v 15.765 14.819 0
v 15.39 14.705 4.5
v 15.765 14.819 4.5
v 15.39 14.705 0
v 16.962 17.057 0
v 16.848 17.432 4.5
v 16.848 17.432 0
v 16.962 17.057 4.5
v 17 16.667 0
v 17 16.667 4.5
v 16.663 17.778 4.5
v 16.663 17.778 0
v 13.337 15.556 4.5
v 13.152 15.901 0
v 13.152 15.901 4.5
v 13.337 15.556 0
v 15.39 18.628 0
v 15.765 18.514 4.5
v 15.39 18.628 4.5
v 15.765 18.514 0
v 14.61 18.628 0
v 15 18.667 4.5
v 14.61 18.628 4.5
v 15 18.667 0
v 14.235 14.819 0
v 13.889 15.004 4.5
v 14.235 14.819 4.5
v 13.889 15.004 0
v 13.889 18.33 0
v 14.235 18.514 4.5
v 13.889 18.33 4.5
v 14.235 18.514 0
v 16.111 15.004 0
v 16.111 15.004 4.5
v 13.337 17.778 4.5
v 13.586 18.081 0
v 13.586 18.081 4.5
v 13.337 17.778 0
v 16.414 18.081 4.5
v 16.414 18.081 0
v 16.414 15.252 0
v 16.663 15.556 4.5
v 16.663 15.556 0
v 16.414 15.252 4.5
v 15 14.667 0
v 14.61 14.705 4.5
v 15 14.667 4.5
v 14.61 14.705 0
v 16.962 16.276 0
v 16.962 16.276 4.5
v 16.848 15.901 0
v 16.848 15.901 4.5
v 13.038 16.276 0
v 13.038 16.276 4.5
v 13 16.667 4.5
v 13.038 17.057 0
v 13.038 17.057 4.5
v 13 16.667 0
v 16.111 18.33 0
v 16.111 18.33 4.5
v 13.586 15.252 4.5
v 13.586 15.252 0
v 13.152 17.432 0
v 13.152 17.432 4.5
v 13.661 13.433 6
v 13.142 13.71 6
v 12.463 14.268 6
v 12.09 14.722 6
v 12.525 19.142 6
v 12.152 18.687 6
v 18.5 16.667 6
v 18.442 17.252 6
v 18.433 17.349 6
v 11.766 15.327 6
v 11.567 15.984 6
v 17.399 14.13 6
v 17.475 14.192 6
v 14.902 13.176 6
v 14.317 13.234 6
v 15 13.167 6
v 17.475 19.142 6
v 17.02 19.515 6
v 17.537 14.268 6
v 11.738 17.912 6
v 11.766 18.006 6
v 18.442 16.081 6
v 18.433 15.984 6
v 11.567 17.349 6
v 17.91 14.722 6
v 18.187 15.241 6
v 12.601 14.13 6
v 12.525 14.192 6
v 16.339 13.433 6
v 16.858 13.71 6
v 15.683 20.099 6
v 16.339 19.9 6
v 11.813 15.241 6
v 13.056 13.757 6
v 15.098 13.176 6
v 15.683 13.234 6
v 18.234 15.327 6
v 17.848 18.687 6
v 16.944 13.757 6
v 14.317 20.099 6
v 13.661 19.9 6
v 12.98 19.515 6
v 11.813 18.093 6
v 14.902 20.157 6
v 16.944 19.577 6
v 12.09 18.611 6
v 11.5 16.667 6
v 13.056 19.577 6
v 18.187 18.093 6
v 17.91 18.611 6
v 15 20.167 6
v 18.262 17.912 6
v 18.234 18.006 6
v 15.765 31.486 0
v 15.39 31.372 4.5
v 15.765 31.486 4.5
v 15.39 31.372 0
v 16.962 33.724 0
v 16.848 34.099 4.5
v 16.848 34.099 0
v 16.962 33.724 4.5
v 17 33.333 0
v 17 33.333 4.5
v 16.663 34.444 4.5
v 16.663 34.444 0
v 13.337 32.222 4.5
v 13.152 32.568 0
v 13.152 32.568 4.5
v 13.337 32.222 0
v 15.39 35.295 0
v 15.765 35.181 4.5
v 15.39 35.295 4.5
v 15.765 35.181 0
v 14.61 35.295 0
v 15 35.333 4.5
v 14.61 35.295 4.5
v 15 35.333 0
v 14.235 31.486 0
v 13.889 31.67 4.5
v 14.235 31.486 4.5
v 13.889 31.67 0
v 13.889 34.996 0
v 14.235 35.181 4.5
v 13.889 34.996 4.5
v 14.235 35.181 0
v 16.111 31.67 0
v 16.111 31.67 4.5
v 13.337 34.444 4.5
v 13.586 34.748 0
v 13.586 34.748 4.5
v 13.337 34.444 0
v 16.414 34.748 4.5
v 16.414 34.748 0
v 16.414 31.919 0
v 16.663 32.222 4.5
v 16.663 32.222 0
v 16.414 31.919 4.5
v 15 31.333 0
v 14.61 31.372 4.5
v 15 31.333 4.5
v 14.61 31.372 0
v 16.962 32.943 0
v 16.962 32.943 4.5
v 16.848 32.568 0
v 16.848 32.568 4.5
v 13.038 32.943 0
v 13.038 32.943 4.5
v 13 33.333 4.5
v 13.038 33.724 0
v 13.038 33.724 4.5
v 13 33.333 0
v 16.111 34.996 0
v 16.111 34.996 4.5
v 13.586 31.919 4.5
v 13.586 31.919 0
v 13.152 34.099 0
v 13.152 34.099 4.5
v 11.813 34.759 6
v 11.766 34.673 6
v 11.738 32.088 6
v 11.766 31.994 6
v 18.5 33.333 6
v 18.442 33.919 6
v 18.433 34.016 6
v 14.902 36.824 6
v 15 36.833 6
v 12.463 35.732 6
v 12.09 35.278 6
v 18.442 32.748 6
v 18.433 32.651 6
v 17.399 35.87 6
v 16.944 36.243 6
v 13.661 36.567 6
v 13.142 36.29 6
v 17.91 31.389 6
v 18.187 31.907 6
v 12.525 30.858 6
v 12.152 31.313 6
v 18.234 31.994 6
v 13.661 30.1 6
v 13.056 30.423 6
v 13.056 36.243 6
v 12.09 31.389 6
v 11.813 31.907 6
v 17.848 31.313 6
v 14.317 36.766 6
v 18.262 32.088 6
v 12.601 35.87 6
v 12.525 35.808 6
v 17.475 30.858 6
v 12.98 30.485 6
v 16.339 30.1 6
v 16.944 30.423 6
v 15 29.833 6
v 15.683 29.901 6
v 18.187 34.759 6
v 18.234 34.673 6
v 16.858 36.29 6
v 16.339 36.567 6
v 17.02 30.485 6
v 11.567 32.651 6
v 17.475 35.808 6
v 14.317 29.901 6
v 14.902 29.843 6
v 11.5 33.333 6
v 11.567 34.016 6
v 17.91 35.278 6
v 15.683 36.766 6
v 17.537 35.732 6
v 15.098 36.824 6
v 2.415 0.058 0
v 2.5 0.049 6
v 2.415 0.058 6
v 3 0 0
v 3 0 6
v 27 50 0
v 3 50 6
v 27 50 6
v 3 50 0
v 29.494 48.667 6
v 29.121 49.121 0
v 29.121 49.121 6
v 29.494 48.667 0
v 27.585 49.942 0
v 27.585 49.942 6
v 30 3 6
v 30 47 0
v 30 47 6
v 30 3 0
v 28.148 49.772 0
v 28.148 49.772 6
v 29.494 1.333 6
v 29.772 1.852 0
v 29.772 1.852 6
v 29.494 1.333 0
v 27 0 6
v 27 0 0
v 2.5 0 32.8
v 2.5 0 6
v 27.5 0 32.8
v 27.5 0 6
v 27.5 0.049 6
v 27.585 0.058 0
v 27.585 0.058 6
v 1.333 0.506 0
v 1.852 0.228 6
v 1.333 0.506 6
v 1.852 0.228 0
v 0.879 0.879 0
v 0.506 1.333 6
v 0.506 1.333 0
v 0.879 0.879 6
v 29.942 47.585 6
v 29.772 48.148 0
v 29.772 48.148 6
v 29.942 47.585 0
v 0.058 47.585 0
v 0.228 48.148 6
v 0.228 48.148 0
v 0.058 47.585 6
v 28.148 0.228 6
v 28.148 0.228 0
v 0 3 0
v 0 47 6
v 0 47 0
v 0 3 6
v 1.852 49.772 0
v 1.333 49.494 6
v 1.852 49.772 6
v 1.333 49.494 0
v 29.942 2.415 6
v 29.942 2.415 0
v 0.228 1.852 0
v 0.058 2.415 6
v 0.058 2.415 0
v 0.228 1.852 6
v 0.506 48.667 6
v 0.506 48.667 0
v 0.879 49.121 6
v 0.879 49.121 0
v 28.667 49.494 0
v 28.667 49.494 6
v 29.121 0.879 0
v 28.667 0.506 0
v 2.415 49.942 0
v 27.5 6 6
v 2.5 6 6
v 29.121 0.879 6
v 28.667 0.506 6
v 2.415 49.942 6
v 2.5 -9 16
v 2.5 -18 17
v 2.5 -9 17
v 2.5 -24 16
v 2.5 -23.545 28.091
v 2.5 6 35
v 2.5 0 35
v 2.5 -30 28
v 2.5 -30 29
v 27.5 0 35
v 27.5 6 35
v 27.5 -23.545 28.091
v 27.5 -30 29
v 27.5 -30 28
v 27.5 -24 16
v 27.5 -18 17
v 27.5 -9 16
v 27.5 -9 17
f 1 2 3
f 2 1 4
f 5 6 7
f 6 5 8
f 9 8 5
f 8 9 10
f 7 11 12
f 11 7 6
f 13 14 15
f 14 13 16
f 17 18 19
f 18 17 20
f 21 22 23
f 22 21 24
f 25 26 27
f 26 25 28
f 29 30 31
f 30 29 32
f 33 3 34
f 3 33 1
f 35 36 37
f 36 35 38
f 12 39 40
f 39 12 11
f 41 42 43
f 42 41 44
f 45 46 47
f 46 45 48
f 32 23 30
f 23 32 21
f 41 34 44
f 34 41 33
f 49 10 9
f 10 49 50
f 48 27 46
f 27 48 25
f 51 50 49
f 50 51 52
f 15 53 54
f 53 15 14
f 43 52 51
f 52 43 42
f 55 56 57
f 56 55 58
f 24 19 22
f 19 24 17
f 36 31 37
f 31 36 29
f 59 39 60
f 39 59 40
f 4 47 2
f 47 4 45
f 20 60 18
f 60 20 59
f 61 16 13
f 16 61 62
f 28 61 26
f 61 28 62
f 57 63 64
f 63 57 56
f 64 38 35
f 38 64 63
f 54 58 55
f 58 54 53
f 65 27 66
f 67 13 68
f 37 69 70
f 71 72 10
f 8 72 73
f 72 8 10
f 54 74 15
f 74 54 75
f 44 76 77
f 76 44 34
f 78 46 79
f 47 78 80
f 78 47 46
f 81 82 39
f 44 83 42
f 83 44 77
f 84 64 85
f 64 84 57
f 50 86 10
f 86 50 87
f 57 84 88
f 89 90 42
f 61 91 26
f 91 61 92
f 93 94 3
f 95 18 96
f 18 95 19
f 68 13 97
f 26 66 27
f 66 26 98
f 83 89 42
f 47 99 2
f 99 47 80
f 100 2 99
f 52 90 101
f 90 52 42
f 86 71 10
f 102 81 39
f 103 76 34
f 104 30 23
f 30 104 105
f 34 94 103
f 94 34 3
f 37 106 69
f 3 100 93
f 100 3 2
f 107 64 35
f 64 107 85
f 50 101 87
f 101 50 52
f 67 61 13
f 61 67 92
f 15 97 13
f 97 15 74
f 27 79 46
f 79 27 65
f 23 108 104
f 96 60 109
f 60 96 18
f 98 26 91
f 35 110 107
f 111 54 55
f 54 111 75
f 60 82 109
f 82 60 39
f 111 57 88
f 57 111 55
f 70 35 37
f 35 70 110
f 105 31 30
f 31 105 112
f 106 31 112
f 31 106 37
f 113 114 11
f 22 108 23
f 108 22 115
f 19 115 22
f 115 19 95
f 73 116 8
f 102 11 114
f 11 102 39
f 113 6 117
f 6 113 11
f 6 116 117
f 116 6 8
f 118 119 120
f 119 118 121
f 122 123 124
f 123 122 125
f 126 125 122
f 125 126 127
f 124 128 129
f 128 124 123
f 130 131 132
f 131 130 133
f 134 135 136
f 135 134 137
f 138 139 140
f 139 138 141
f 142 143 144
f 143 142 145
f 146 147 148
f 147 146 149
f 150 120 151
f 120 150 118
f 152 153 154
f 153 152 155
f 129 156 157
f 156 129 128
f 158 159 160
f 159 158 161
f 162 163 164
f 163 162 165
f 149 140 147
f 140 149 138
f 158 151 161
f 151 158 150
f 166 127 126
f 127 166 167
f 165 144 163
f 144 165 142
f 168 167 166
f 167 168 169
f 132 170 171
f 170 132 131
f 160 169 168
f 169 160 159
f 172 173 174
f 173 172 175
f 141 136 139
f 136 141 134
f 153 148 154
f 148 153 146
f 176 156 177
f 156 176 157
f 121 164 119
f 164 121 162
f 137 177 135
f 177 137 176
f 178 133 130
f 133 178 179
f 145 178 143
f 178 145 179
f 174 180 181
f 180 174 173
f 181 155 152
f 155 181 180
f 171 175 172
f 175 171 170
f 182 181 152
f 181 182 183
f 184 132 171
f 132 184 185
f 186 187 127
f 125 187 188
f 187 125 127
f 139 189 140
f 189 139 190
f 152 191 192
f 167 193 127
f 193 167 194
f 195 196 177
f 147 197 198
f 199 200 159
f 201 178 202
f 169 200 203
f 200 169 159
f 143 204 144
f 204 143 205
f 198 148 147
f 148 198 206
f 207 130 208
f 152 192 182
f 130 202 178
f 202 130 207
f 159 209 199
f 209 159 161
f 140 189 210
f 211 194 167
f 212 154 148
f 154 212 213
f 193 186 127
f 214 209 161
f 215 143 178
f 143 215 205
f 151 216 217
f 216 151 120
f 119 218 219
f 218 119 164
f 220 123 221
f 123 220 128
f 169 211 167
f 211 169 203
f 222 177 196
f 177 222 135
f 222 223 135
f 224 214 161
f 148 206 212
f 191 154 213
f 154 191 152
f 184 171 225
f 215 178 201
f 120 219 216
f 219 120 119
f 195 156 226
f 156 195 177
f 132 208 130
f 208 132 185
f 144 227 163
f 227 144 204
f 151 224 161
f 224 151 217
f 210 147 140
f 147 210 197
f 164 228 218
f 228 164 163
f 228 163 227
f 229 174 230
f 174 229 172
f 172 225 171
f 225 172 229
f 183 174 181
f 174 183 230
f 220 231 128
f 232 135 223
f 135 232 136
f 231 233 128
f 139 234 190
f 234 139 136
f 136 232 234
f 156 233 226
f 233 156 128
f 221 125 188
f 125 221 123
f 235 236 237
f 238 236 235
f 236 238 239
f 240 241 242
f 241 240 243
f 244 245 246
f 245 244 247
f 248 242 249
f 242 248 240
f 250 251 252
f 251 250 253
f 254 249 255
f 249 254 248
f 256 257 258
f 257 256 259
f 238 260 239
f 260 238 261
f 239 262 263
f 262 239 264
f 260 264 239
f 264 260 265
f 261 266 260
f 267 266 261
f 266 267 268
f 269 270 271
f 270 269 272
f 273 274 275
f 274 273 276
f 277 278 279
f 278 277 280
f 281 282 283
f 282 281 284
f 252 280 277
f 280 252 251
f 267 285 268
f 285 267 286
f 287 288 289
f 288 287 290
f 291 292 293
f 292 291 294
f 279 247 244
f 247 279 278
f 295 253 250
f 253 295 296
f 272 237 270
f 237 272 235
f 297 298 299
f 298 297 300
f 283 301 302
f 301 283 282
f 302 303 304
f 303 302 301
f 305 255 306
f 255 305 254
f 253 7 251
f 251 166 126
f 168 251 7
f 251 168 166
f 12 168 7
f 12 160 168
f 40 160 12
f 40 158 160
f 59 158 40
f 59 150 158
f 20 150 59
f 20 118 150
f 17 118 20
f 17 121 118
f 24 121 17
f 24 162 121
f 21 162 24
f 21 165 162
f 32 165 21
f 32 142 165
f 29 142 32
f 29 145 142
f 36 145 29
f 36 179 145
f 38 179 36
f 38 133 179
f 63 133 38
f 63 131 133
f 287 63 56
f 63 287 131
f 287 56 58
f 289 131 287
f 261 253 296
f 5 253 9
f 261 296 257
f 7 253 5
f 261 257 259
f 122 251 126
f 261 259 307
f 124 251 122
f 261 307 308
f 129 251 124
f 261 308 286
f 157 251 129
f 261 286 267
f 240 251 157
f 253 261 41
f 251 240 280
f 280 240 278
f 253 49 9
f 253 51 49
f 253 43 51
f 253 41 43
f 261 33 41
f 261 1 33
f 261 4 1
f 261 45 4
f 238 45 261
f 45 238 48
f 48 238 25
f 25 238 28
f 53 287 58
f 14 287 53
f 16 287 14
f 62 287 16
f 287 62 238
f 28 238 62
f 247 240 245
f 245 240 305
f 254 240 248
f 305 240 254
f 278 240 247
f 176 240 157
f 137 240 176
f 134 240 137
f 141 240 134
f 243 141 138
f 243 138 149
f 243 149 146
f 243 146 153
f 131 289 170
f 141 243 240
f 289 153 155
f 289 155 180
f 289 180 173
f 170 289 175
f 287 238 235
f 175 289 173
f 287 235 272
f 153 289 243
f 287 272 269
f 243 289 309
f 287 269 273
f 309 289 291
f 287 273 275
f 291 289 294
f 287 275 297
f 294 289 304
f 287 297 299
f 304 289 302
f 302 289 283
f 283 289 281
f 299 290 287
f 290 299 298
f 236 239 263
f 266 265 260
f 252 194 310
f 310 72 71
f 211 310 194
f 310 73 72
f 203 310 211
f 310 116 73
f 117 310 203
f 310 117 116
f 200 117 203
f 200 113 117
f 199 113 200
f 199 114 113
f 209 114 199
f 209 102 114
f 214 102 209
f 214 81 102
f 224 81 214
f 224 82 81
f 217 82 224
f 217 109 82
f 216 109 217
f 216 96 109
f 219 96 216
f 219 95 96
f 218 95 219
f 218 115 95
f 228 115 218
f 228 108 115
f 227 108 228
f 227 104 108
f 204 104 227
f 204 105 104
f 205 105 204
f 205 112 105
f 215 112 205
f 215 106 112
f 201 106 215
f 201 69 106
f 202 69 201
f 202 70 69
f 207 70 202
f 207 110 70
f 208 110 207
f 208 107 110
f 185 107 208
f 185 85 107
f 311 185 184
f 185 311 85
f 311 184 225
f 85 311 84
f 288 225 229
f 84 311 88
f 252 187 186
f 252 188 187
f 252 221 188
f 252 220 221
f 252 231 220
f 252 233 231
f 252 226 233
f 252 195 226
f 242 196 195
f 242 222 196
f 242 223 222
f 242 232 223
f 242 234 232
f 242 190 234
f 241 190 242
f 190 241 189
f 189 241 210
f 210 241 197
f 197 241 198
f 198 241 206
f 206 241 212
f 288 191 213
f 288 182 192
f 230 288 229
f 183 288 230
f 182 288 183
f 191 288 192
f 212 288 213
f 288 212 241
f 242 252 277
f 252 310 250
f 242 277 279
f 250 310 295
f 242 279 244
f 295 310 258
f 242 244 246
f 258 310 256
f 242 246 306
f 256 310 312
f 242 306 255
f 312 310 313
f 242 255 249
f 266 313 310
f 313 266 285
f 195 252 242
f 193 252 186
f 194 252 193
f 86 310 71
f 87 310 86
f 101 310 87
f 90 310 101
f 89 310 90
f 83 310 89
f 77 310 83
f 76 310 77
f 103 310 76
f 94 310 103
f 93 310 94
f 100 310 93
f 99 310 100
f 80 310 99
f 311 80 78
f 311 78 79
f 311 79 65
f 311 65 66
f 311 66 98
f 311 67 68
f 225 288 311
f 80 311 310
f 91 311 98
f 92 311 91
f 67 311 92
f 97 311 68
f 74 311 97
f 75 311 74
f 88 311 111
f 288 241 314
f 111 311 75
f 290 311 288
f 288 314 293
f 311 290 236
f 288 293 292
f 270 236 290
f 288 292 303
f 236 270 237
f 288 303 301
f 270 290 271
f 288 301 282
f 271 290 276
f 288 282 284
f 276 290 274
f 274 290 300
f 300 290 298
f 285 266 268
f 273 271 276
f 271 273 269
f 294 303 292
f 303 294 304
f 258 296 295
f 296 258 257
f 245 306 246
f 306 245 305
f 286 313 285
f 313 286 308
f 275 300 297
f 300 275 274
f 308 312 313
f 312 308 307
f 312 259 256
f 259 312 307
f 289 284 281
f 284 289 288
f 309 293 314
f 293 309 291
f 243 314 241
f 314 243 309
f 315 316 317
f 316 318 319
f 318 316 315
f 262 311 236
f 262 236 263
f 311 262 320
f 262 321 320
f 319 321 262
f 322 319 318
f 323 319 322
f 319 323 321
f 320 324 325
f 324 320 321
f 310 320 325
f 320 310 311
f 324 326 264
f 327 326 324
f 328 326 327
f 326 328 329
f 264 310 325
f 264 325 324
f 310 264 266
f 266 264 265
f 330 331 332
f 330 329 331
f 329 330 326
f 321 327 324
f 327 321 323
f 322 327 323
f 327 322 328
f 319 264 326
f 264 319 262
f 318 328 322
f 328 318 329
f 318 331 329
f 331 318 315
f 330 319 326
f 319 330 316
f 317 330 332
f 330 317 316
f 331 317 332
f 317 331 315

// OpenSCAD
// Vorea Studio — Parametric Wall Hook
// Strong wall hook with smooth curves using hull()
// Compatible: Vorea Studio SCAD Engine

// [Section: Dimensions]
hook_width = 25;       // [15:5:50] Ancho del gancho (mm)
hook_depth = 30;       // [15:5:60] Profundidad del gancho (mm)  
hook_height = 40;      // [25:5:80] Altura total (mm)
thickness = 6;         // [3:1:12] Grosor del material

// [Section: Mount]
plate_height = 50;     // [30:5:80] Altura de la placa de montaje
plate_width = 30;      // [20:5:50] Ancho de la placa
screw_holes = 2;       // [1:1:3] Numero de agujeros para tornillos
screw_dia = 4;         // [3:0.5:6] Diametro de tornillos

// [Section: Style]
fillet = 3;            // [1:1:8] Radio de filetes

$fn = 32;

// Mounting plate
difference() {
  hull() {
    translate([fillet, fillet, 0]) cylinder(r=fillet, h=thickness);
    translate([plate_width-fillet, fillet, 0]) cylinder(r=fillet, h=thickness);
    translate([fillet, plate_height-fillet, 0]) cylinder(r=fillet, h=thickness);
    translate([plate_width-fillet, plate_height-fillet, 0]) cylinder(r=fillet, h=thickness);
  }
  
  // Screw holes
  for (i = [1 : screw_holes]) {
    y_pos = plate_height / (screw_holes + 1) * i;
    translate([plate_width/2, y_pos, -0.5])
      cylinder(r = screw_dia/2, h = thickness + 1);
    // Countersink
    translate([plate_width/2, y_pos, thickness - 1.5])
      cylinder(r1 = screw_dia/2, r2 = screw_dia, h = 2);
  }
}

// Hook arm — smooth curved shape using hull()
// Vertical section
translate([plate_width/2 - hook_width/2, 0, 0])
  hull() {
    translate([0, 0, thickness])
      cube([hook_width, thickness, 1]);
    translate([0, 0, hook_height - thickness])
      cube([hook_width, thickness, 1]);
  }

// Top curve going outward
translate([plate_width/2 - hook_width/2, 0, 0])
  hull() {
    translate([0, 0, hook_height - thickness])
      cube([hook_width, thickness, 1]);
    translate([0, -hook_depth, hook_height - thickness * 2])
      cube([hook_width, thickness, 1]);
  }

// Hook curve going down
translate([plate_width/2 - hook_width/2, 0, 0])
  hull() {
    translate([0, -hook_depth, hook_height - thickness * 2])
      cube([hook_width, thickness, 1]);
    translate([0, -hook_depth + thickness, hook_height - thickness * 4])
      cube([hook_width, thickness, 1]);
  }

// Hook tip curl
translate([plate_width/2 - hook_width/2, 0, 0])
  hull() {
    translate([0, -hook_depth + thickness, hook_height - thickness * 4])
      cube([hook_width, thickness, 1]);
    translate([0, -hook_depth/2, hook_height - thickness * 4])
      cube([hook_width, thickness, 1]);
  }
